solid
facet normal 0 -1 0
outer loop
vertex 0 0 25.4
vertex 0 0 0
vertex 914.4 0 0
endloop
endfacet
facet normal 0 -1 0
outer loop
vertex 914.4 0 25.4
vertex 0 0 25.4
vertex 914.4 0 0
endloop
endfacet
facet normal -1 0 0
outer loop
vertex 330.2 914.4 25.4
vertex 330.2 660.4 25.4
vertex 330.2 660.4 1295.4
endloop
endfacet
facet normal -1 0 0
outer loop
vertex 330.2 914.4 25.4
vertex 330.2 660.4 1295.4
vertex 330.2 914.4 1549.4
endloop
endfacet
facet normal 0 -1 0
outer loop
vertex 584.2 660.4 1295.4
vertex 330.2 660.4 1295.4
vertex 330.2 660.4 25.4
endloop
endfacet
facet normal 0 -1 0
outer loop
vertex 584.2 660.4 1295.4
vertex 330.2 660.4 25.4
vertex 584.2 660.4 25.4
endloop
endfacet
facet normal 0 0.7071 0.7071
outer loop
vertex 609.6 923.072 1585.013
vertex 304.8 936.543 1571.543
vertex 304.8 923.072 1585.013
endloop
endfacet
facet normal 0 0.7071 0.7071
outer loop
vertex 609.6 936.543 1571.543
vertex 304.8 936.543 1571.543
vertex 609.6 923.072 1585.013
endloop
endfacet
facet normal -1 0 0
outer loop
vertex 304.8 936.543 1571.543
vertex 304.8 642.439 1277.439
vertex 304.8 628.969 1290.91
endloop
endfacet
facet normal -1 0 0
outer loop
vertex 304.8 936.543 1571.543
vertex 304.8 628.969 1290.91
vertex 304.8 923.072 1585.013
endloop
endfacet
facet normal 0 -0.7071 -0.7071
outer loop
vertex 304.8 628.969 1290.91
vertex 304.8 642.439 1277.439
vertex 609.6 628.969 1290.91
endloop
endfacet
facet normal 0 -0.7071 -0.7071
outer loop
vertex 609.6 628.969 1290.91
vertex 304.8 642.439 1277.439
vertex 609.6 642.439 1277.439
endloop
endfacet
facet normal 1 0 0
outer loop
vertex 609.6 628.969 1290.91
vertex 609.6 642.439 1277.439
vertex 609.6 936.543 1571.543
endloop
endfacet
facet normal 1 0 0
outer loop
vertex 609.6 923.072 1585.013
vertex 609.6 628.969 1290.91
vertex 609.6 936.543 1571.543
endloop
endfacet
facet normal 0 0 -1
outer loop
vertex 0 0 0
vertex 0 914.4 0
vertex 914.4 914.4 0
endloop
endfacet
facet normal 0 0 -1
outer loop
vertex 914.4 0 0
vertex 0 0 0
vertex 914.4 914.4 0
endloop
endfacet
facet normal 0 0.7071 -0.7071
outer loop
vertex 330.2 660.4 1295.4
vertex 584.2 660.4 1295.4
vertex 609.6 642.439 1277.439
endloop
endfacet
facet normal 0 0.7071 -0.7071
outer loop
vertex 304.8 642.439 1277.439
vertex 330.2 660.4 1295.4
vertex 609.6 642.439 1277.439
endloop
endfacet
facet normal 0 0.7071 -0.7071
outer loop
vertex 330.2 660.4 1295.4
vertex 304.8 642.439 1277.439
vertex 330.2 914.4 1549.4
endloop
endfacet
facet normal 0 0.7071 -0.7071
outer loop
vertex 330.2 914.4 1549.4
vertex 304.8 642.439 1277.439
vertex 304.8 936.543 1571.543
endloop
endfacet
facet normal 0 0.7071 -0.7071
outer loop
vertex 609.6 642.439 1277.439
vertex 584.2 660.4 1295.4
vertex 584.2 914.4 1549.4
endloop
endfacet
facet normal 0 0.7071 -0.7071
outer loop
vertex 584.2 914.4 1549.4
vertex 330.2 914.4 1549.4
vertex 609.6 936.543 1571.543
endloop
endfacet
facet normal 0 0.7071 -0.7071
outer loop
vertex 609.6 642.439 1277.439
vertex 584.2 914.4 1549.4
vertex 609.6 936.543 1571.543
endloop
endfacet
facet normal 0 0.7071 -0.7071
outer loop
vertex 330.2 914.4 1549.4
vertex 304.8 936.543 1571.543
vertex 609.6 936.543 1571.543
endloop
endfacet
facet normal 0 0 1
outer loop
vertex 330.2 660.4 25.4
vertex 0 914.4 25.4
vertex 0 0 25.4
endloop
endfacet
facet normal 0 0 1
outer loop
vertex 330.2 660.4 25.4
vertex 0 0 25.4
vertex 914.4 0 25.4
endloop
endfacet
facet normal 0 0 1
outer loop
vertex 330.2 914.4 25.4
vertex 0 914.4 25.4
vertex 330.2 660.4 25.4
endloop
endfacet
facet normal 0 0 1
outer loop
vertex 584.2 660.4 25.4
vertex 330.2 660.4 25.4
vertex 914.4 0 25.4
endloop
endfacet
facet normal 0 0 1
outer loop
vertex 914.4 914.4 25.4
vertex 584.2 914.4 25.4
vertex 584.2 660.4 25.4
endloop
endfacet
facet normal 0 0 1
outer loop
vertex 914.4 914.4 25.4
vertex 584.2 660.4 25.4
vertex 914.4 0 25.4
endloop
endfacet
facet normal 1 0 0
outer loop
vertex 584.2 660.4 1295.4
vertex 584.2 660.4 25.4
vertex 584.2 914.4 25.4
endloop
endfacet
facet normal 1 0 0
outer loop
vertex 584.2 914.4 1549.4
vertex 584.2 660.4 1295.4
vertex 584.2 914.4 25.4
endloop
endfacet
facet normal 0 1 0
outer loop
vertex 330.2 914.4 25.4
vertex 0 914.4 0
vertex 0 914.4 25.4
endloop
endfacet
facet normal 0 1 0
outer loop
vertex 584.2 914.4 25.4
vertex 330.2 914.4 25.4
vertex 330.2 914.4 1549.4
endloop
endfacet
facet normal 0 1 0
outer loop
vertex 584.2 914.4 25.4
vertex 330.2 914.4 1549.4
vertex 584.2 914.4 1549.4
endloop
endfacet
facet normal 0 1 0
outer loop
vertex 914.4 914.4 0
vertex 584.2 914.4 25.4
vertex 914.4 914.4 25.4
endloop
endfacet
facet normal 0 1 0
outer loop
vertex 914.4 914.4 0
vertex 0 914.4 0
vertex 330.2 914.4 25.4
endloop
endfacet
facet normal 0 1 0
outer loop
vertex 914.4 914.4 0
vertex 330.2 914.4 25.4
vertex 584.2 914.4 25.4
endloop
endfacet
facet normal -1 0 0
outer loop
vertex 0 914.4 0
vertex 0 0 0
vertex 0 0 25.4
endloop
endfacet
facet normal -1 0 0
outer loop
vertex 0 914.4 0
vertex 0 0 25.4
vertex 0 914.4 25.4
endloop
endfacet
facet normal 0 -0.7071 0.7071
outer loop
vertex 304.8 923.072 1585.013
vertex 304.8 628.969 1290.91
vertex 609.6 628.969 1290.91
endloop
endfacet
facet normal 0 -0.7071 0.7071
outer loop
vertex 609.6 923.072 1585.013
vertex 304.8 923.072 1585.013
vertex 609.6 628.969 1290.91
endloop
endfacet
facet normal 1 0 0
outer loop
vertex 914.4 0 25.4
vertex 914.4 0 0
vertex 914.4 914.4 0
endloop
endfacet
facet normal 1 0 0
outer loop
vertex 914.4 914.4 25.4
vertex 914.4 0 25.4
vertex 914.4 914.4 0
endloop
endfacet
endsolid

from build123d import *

# Parameters (mm, degrees)
F0_W     = 914.4
F0_H     = 914.4
F1_DEPTH = 25.4
F2_W     = 254
F2_H     = 254
F3_DEPTH = 1524
F5_DEPTH = 584.201
F6_W     = 304.8
F6_H     = 415.925
F7_DEPTH = 19.05


with BuildPart() as f1:
    # F0 (on Top) → F1 (new body)
    with BuildSketch(Plane.XY):
        with Locations((457.2, 457.2)):
            Rectangle(F0_W, F0_H)
    extrude(amount=F1_DEPTH)

    # F2 (on face) → F3 (join)
    with BuildSketch(Plane.XY.offset(25.4)):
        with Locations((457.2, 787.4)):
            Rectangle(F2_W, F2_H)
    extrude(amount=F3_DEPTH)

    # F4 (on face) → F5 (cut, through all)
    with BuildSketch(Plane.YZ.offset(584.2)):
        Polygon((660.4, 1295.4), (914.4, 1549.4), (660.4, 1549.4), align=None)
    extrude(amount=-F5_DEPTH, mode=Mode.SUBTRACT)

    # F6 (on face) → F7 (join)
    with BuildSketch(Plane(origin=(0, -317.5, 317.5), x_dir=(1, 0, 0), z_dir=(0, -0.707107, 0.707107))):
        with Locations((457.2, 1565.521943)):
            Rectangle(F6_W, F6_H)
    extrude(amount=F7_DEPTH)


solid = f1.part
